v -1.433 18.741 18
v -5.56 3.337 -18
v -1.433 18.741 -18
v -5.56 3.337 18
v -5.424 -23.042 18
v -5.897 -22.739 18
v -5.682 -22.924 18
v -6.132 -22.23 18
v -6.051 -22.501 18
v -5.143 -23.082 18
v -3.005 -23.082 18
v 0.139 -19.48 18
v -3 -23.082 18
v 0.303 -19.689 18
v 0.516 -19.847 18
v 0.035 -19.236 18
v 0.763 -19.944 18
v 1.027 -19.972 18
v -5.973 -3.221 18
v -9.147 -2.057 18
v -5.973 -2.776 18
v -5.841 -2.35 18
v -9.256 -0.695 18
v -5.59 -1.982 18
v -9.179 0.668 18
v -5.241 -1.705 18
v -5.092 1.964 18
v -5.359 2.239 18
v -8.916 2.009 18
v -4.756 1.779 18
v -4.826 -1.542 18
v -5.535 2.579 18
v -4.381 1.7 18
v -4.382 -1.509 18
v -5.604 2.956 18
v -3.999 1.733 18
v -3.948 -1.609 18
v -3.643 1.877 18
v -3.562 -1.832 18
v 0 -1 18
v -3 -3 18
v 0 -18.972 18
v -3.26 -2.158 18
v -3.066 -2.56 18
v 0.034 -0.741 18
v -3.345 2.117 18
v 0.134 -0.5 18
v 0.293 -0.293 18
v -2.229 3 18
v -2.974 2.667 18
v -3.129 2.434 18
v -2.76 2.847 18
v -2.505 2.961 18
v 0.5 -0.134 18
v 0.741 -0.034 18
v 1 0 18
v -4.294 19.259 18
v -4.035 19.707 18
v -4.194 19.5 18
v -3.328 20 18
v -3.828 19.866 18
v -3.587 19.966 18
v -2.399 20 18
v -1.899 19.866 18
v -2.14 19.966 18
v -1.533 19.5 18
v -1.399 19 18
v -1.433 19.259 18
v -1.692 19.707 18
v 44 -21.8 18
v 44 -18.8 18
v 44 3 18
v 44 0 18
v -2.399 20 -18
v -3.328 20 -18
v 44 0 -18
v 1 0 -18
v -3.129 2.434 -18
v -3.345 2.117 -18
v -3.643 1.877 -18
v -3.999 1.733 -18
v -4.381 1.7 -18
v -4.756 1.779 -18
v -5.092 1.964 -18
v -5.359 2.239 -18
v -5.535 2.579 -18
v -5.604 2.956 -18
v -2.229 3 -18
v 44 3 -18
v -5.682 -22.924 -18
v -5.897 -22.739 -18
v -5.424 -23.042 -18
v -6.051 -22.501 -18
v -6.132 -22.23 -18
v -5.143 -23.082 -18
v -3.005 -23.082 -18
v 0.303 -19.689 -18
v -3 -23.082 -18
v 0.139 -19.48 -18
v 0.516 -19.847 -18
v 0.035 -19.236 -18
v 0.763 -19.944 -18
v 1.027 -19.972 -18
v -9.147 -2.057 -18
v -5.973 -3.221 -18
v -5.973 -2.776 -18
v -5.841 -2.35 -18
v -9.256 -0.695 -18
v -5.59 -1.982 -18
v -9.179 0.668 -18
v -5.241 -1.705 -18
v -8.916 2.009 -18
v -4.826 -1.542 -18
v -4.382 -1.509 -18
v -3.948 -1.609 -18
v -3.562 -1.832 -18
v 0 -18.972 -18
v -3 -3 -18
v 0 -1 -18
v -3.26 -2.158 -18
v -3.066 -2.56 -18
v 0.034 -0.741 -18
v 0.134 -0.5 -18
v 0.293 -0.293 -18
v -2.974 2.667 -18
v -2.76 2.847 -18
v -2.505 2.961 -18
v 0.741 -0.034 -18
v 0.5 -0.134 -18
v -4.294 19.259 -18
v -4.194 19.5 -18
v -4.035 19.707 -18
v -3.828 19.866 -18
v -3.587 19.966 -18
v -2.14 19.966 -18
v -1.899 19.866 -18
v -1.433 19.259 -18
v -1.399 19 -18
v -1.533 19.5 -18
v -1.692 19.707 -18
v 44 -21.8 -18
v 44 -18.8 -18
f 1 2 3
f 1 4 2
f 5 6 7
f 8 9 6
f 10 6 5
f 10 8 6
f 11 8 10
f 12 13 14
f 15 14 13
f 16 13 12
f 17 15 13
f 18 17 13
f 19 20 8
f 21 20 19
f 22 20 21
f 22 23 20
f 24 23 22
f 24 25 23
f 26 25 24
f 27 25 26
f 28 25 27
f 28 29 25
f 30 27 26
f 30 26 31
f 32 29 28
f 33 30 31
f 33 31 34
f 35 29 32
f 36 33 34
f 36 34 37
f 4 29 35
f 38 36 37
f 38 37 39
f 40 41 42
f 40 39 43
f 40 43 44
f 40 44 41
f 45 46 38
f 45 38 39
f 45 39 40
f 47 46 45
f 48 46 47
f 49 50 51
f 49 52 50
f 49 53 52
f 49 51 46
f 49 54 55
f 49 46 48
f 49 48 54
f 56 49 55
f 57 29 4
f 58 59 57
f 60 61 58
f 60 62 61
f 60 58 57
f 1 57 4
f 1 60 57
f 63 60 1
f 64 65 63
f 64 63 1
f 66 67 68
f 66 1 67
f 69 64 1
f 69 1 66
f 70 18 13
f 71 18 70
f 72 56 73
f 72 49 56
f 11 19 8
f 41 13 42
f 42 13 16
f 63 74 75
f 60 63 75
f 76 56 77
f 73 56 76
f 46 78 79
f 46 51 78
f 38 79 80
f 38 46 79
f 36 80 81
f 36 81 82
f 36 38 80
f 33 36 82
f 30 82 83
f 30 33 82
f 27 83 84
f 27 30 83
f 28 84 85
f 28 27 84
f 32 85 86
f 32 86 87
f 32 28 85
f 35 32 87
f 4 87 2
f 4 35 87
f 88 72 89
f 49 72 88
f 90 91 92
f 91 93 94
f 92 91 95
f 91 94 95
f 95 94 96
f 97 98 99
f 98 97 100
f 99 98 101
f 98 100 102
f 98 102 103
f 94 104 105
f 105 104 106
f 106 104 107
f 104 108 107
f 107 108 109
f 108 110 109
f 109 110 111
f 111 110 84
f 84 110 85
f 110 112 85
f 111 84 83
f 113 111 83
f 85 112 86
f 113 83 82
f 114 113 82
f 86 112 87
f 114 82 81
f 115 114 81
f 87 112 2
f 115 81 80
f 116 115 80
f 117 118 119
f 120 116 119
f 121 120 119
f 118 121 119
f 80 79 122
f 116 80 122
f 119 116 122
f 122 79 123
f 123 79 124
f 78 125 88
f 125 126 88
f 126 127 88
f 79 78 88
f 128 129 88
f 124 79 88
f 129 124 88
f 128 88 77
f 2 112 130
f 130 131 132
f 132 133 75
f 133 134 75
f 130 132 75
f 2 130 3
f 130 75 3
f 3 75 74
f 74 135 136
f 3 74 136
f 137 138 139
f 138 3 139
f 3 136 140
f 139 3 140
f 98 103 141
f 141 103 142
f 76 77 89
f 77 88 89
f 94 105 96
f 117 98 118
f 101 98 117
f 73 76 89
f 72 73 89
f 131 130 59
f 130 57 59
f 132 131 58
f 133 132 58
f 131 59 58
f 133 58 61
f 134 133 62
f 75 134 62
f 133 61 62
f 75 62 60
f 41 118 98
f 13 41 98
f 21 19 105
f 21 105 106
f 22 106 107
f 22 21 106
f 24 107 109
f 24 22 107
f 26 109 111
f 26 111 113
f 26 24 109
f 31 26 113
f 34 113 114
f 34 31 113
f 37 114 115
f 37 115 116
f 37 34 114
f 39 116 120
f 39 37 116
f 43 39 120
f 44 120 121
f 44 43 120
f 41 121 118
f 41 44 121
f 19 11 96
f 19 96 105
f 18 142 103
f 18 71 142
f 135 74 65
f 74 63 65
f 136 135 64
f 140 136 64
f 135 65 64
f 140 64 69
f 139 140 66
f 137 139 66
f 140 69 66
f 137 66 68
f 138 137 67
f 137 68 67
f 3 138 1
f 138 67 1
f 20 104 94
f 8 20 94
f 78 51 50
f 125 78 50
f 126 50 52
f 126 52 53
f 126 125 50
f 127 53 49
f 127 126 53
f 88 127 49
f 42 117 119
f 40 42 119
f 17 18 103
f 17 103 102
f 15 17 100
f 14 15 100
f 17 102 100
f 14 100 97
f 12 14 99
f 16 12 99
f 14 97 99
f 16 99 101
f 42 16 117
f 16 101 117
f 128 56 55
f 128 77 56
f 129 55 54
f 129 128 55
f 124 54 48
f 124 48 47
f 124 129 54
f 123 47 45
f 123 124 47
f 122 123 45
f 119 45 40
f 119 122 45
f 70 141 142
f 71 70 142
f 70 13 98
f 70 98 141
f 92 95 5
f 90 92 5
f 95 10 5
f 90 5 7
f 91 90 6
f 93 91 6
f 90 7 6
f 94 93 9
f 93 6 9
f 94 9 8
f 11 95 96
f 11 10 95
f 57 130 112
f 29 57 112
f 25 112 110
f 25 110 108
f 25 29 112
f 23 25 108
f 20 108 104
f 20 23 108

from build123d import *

# Parameters (mm, degrees)
F1_DEPTH      = 18
F1_DEPTH_BACK = 18
F3_DEPTH      = 18
F3_DEPTH_BACK = 18
F4_R          = 1
F5_R          = 10
F6_R          = 1


with BuildPart() as f1:
    # F0 (on Top) → F1 (new body, two sides)
    with BuildSketch(Plane.XY) as f1_sk:
        Polygon((0, 0), (44, 0), (44, 3), (-3, 3), (-3, -23.081818), (44, -21.8), (44, -18.8), (0, -20), align=None)
    extrude(amount=F1_DEPTH)
    extrude(f1_sk.sketch, amount=-F1_DEPTH_BACK)

    # F2 (on Top) → F3 (join, two sides)
    with BuildSketch(Plane.XY) as f3_sk:
        with BuildLine():
            ThreePointArc((-3, 3), (-4.472403, 1.708738), (-5.560431, 3.337087))
            Line((-5.560431, 3.337087), (-1.095617, 20))
            Line((-1.095617, 20), (-4.095617, 20))
            Line((-4.095617, 20), (-9.454601, 0))
            Line((-9.454601, 0), (-6.005, -23.081818))
            Line((-6.005, -23.081818), (-3.005, -23.081818))
            Line((-3.005, -23.081818), (-5.973227, -3.220949))
            ThreePointArc((-5.973227, -3.220949), (-4.605602, -1.509287), (-3, -3))
            Line((-3, -3), (-3, 3))
        make_face()
    extrude(amount=F3_DEPTH)
    extrude(f3_sk.sketch, amount=-F3_DEPTH_BACK)

    # F4
    f4_edges = [f1.edges().sort_by_distance(p)[0] for p in [
        (-4.095617, 20, 0),
        (-1.095617, 20, 0),
        (-3, 3, 0),
        (-6.005, -23.081818, 0),
    ]]
    fillet(f4_edges, radius=F4_R)

    # F5
    f5_edges = [f1.edges().sort_by_distance(p)[0] for p in [
        (-9.454601, 0, 0),
    ]]
    fillet(f5_edges, radius=F5_R)

    # F6
    f6_edges = [f1.edges().sort_by_distance(p)[0] for p in [
        (0, 0, 0),
        (0, -20, 0),
    ]]
    fillet(f6_edges, radius=F6_R)


solid = f1.part
